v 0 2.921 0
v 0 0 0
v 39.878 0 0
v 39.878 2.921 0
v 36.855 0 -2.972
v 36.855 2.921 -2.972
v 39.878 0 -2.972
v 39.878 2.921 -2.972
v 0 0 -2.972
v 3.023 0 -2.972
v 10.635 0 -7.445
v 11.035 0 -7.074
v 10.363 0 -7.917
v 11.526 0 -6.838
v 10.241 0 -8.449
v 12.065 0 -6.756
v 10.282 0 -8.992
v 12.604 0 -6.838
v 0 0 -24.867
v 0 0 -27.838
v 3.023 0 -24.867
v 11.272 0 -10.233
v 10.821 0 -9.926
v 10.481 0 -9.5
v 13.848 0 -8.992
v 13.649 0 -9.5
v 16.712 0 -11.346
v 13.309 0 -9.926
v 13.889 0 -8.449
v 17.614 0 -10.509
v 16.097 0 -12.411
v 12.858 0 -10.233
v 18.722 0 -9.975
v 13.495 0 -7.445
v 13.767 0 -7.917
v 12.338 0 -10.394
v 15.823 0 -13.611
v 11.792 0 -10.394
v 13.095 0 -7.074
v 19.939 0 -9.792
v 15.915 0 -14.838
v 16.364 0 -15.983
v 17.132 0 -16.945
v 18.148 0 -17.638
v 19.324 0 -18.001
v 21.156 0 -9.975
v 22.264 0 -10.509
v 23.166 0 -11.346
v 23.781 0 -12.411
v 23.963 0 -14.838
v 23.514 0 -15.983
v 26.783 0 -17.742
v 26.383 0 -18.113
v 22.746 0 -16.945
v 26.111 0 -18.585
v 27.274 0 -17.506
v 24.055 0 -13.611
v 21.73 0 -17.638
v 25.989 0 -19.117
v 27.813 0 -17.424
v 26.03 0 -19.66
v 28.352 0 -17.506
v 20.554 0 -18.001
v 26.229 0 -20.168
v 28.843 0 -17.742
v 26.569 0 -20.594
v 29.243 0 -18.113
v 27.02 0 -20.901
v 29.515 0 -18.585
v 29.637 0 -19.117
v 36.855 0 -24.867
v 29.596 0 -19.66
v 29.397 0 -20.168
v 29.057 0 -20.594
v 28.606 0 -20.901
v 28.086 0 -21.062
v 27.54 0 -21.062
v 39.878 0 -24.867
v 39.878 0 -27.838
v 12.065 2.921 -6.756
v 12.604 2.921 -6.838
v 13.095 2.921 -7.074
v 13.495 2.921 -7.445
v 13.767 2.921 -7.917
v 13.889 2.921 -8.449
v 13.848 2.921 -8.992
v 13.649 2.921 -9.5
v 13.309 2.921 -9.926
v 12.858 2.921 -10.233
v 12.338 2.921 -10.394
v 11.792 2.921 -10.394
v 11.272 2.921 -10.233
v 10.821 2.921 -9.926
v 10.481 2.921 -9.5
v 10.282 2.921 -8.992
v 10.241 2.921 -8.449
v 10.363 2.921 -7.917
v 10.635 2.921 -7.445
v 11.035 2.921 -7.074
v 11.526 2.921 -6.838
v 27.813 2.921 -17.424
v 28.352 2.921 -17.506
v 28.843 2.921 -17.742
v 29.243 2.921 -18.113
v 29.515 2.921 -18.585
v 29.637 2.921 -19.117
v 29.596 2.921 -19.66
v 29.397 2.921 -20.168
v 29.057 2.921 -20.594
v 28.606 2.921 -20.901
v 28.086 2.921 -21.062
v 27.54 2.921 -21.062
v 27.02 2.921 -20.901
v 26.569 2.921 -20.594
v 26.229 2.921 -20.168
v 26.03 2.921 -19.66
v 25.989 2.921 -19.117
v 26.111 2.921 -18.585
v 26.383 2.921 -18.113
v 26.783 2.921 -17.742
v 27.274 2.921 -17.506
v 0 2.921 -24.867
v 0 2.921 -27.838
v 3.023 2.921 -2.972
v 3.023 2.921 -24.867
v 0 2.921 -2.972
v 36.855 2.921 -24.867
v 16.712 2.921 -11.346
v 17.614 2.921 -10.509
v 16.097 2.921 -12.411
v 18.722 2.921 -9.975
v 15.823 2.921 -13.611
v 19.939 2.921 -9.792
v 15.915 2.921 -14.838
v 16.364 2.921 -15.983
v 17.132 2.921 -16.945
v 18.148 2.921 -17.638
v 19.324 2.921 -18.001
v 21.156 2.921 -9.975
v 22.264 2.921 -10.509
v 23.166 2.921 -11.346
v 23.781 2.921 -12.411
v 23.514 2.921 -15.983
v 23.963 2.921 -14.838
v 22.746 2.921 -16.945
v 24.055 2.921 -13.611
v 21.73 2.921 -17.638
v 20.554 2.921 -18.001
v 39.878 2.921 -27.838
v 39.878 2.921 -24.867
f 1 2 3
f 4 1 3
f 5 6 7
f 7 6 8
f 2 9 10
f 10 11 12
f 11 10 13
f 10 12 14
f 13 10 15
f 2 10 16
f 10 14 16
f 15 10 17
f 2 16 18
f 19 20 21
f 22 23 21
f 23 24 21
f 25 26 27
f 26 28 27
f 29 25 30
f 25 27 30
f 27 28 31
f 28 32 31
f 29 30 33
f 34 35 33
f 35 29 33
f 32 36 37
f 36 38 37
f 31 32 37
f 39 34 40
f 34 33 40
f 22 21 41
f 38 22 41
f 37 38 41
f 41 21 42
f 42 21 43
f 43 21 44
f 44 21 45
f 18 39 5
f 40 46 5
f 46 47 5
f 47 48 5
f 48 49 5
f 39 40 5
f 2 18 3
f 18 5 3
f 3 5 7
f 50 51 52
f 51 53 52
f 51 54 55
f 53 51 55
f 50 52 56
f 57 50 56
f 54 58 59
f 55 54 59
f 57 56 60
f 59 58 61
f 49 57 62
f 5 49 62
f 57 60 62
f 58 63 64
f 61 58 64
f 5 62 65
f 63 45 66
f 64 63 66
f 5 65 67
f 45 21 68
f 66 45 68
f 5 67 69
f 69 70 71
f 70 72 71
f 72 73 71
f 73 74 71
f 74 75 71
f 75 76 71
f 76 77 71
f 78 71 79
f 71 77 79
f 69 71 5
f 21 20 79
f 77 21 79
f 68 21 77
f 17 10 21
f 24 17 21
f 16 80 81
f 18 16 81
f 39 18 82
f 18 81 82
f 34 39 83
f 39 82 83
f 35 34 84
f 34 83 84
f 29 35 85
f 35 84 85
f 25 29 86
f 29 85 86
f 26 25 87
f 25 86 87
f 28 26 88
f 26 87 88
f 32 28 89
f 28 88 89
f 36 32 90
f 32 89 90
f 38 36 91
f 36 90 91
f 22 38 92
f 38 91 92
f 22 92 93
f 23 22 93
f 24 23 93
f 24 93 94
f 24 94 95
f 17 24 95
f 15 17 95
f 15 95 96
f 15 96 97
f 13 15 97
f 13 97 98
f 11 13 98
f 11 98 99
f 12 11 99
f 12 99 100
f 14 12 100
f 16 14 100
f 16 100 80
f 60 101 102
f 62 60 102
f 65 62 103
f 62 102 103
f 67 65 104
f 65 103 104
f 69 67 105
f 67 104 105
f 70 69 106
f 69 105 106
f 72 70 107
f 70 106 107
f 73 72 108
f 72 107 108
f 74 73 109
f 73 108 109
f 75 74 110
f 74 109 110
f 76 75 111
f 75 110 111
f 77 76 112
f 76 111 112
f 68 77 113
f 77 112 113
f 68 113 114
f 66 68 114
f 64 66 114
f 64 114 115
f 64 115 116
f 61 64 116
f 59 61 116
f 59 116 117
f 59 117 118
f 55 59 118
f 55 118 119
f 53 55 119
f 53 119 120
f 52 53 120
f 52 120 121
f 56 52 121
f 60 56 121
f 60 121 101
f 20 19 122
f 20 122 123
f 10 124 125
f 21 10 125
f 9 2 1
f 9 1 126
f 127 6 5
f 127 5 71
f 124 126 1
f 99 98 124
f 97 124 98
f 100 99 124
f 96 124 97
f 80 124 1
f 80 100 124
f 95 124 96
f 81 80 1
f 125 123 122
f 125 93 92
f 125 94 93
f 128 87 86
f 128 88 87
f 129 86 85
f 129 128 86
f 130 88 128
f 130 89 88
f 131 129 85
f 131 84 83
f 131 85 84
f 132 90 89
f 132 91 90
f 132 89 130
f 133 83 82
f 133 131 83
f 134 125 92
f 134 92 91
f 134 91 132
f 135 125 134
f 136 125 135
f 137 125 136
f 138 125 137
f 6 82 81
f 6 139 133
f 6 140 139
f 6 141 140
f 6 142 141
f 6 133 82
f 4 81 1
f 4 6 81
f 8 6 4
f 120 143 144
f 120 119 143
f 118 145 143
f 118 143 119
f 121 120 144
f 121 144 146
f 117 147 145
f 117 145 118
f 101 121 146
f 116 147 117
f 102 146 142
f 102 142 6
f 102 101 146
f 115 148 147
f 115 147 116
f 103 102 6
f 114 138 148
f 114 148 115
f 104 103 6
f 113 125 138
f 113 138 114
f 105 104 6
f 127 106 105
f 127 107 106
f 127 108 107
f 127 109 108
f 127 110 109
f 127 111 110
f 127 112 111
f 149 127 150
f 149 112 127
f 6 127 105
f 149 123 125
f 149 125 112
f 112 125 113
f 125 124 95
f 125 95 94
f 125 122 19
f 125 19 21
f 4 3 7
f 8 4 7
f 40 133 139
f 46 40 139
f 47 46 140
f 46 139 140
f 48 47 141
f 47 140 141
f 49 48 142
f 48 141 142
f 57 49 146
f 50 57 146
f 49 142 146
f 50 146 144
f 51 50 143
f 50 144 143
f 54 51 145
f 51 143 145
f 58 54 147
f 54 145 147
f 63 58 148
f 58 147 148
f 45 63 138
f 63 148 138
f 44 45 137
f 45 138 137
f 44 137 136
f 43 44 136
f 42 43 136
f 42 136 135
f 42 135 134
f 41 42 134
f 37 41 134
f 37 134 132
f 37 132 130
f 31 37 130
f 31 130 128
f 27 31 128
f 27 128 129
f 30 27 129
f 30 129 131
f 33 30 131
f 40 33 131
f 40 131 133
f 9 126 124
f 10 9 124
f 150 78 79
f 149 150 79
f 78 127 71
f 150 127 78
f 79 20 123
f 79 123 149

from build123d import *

# Parameters (mm, degrees)
SKETCH1_W           = 39.878
SKETCH1_H           = 27.8384
BOSS_EXTRUDE1_DEPTH = 2.921
CUT_EXTRUDE2_REACH  = 50.721
SKETCH3_W           = 3.0226
SKETCH3_H           = 21.8948
CUT_EXTRUDE1_REACH  = 50.721
SKETCH2_R           = 4.1275
SKETCH2_R_2         = 1.8288


with BuildPart() as part:
    # Sketch1 → Boss-Extrude1 (new body)
    with BuildSketch(Plane(origin=(0, 0, 0), x_dir=(1, 0, 0), z_dir=(0, 1, 0))):
        with Locations((19.939, 13.9192)):
            Rectangle(SKETCH1_W, SKETCH1_H)
    extrude(amount=BOSS_EXTRUDE1_DEPTH)

    # Sketch3 → Cut-Extrude2 (cut, up to next)
    with BuildSketch(Plane(origin=(0, 2.921, 0), x_dir=(1, 0, 0), z_dir=(0, 1, 0)), mode=Mode.PRIVATE) as cut_extrude2_sk1:
        with Locations((1.5113, 13.9192)):
            Rectangle(SKETCH3_W, SKETCH3_H)
    cut_extrude2_tool1 = extrude(cut_extrude2_sk1.sketch, amount=-CUT_EXTRUDE2_REACH, mode=Mode.PRIVATE) & part.part
    # Sketch3 → Cut-Extrude2 (cut, up to next)
    with BuildSketch(Plane(origin=(0, 2.921, 0), x_dir=(1, 0, 0), z_dir=(0, 1, 0)), mode=Mode.PRIVATE) as cut_extrude2_sk2:
        with Locations((38.3667, 13.9192)):
            Rectangle(SKETCH3_W, SKETCH3_H)
    cut_extrude2_tool2 = extrude(cut_extrude2_sk2.sketch, amount=-CUT_EXTRUDE2_REACH, mode=Mode.PRIVATE) & part.part
    add(cut_extrude2_tool1.solids().sort_by_distance((1.5113, 2.921, -13.9192))[0], mode=Mode.SUBTRACT)
    add(cut_extrude2_tool2.solids().sort_by_distance((38.3667, 2.921, -13.9192))[0], mode=Mode.SUBTRACT)

    # Sketch2 → Cut-Extrude1 (cut, up to next)
    with BuildSketch(Plane(origin=(0, 2.921, 0), x_dir=(1, 0, 0), z_dir=(0, 1, 0)), mode=Mode.PRIVATE) as cut_extrude1_sk1:
        with Locations(Location((19.939, 13.9192, 0), (0, 0, 270))):
            Circle(SKETCH2_R)
    cut_extrude1_tool1 = extrude(cut_extrude1_sk1.sketch, amount=-CUT_EXTRUDE1_REACH, mode=Mode.PRIVATE) & part.part
    # Sketch2 → Cut-Extrude1 (cut, up to next)
    with BuildSketch(Plane(origin=(0, 2.921, 0), x_dir=(1, 0, 0), z_dir=(0, 1, 0)), mode=Mode.PRIVATE) as cut_extrude1_sk2:
        with Locations(Location((12.065, 8.5852, 0), (0, 0, 270))):
            Circle(SKETCH2_R_2)
    cut_extrude1_tool2 = extrude(cut_extrude1_sk2.sketch, amount=-CUT_EXTRUDE1_REACH, mode=Mode.PRIVATE) & part.part
    # Sketch2 → Cut-Extrude1 (cut, up to next)
    with BuildSketch(Plane(origin=(0, 2.921, 0), x_dir=(1, 0, 0), z_dir=(0, 1, 0)), mode=Mode.PRIVATE) as cut_extrude1_sk3:
        with Locations(Location((27.813, 19.2532, 0), (0, 0, 270))):
            Circle(SKETCH2_R_2)
    cut_extrude1_tool3 = extrude(cut_extrude1_sk3.sketch, amount=-CUT_EXTRUDE1_REACH, mode=Mode.PRIVATE) & part.part
    add(cut_extrude1_tool1.solids().sort_by_distance((19.939, 2.921, -13.9192))[0], mode=Mode.SUBTRACT)
    add(cut_extrude1_tool2.solids().sort_by_distance((12.065, 2.921, -8.5852))[0], mode=Mode.SUBTRACT)
    add(cut_extrude1_tool3.solids().sort_by_distance((27.813, 2.921, -19.2532))[0], mode=Mode.SUBTRACT)


solid = part.part
